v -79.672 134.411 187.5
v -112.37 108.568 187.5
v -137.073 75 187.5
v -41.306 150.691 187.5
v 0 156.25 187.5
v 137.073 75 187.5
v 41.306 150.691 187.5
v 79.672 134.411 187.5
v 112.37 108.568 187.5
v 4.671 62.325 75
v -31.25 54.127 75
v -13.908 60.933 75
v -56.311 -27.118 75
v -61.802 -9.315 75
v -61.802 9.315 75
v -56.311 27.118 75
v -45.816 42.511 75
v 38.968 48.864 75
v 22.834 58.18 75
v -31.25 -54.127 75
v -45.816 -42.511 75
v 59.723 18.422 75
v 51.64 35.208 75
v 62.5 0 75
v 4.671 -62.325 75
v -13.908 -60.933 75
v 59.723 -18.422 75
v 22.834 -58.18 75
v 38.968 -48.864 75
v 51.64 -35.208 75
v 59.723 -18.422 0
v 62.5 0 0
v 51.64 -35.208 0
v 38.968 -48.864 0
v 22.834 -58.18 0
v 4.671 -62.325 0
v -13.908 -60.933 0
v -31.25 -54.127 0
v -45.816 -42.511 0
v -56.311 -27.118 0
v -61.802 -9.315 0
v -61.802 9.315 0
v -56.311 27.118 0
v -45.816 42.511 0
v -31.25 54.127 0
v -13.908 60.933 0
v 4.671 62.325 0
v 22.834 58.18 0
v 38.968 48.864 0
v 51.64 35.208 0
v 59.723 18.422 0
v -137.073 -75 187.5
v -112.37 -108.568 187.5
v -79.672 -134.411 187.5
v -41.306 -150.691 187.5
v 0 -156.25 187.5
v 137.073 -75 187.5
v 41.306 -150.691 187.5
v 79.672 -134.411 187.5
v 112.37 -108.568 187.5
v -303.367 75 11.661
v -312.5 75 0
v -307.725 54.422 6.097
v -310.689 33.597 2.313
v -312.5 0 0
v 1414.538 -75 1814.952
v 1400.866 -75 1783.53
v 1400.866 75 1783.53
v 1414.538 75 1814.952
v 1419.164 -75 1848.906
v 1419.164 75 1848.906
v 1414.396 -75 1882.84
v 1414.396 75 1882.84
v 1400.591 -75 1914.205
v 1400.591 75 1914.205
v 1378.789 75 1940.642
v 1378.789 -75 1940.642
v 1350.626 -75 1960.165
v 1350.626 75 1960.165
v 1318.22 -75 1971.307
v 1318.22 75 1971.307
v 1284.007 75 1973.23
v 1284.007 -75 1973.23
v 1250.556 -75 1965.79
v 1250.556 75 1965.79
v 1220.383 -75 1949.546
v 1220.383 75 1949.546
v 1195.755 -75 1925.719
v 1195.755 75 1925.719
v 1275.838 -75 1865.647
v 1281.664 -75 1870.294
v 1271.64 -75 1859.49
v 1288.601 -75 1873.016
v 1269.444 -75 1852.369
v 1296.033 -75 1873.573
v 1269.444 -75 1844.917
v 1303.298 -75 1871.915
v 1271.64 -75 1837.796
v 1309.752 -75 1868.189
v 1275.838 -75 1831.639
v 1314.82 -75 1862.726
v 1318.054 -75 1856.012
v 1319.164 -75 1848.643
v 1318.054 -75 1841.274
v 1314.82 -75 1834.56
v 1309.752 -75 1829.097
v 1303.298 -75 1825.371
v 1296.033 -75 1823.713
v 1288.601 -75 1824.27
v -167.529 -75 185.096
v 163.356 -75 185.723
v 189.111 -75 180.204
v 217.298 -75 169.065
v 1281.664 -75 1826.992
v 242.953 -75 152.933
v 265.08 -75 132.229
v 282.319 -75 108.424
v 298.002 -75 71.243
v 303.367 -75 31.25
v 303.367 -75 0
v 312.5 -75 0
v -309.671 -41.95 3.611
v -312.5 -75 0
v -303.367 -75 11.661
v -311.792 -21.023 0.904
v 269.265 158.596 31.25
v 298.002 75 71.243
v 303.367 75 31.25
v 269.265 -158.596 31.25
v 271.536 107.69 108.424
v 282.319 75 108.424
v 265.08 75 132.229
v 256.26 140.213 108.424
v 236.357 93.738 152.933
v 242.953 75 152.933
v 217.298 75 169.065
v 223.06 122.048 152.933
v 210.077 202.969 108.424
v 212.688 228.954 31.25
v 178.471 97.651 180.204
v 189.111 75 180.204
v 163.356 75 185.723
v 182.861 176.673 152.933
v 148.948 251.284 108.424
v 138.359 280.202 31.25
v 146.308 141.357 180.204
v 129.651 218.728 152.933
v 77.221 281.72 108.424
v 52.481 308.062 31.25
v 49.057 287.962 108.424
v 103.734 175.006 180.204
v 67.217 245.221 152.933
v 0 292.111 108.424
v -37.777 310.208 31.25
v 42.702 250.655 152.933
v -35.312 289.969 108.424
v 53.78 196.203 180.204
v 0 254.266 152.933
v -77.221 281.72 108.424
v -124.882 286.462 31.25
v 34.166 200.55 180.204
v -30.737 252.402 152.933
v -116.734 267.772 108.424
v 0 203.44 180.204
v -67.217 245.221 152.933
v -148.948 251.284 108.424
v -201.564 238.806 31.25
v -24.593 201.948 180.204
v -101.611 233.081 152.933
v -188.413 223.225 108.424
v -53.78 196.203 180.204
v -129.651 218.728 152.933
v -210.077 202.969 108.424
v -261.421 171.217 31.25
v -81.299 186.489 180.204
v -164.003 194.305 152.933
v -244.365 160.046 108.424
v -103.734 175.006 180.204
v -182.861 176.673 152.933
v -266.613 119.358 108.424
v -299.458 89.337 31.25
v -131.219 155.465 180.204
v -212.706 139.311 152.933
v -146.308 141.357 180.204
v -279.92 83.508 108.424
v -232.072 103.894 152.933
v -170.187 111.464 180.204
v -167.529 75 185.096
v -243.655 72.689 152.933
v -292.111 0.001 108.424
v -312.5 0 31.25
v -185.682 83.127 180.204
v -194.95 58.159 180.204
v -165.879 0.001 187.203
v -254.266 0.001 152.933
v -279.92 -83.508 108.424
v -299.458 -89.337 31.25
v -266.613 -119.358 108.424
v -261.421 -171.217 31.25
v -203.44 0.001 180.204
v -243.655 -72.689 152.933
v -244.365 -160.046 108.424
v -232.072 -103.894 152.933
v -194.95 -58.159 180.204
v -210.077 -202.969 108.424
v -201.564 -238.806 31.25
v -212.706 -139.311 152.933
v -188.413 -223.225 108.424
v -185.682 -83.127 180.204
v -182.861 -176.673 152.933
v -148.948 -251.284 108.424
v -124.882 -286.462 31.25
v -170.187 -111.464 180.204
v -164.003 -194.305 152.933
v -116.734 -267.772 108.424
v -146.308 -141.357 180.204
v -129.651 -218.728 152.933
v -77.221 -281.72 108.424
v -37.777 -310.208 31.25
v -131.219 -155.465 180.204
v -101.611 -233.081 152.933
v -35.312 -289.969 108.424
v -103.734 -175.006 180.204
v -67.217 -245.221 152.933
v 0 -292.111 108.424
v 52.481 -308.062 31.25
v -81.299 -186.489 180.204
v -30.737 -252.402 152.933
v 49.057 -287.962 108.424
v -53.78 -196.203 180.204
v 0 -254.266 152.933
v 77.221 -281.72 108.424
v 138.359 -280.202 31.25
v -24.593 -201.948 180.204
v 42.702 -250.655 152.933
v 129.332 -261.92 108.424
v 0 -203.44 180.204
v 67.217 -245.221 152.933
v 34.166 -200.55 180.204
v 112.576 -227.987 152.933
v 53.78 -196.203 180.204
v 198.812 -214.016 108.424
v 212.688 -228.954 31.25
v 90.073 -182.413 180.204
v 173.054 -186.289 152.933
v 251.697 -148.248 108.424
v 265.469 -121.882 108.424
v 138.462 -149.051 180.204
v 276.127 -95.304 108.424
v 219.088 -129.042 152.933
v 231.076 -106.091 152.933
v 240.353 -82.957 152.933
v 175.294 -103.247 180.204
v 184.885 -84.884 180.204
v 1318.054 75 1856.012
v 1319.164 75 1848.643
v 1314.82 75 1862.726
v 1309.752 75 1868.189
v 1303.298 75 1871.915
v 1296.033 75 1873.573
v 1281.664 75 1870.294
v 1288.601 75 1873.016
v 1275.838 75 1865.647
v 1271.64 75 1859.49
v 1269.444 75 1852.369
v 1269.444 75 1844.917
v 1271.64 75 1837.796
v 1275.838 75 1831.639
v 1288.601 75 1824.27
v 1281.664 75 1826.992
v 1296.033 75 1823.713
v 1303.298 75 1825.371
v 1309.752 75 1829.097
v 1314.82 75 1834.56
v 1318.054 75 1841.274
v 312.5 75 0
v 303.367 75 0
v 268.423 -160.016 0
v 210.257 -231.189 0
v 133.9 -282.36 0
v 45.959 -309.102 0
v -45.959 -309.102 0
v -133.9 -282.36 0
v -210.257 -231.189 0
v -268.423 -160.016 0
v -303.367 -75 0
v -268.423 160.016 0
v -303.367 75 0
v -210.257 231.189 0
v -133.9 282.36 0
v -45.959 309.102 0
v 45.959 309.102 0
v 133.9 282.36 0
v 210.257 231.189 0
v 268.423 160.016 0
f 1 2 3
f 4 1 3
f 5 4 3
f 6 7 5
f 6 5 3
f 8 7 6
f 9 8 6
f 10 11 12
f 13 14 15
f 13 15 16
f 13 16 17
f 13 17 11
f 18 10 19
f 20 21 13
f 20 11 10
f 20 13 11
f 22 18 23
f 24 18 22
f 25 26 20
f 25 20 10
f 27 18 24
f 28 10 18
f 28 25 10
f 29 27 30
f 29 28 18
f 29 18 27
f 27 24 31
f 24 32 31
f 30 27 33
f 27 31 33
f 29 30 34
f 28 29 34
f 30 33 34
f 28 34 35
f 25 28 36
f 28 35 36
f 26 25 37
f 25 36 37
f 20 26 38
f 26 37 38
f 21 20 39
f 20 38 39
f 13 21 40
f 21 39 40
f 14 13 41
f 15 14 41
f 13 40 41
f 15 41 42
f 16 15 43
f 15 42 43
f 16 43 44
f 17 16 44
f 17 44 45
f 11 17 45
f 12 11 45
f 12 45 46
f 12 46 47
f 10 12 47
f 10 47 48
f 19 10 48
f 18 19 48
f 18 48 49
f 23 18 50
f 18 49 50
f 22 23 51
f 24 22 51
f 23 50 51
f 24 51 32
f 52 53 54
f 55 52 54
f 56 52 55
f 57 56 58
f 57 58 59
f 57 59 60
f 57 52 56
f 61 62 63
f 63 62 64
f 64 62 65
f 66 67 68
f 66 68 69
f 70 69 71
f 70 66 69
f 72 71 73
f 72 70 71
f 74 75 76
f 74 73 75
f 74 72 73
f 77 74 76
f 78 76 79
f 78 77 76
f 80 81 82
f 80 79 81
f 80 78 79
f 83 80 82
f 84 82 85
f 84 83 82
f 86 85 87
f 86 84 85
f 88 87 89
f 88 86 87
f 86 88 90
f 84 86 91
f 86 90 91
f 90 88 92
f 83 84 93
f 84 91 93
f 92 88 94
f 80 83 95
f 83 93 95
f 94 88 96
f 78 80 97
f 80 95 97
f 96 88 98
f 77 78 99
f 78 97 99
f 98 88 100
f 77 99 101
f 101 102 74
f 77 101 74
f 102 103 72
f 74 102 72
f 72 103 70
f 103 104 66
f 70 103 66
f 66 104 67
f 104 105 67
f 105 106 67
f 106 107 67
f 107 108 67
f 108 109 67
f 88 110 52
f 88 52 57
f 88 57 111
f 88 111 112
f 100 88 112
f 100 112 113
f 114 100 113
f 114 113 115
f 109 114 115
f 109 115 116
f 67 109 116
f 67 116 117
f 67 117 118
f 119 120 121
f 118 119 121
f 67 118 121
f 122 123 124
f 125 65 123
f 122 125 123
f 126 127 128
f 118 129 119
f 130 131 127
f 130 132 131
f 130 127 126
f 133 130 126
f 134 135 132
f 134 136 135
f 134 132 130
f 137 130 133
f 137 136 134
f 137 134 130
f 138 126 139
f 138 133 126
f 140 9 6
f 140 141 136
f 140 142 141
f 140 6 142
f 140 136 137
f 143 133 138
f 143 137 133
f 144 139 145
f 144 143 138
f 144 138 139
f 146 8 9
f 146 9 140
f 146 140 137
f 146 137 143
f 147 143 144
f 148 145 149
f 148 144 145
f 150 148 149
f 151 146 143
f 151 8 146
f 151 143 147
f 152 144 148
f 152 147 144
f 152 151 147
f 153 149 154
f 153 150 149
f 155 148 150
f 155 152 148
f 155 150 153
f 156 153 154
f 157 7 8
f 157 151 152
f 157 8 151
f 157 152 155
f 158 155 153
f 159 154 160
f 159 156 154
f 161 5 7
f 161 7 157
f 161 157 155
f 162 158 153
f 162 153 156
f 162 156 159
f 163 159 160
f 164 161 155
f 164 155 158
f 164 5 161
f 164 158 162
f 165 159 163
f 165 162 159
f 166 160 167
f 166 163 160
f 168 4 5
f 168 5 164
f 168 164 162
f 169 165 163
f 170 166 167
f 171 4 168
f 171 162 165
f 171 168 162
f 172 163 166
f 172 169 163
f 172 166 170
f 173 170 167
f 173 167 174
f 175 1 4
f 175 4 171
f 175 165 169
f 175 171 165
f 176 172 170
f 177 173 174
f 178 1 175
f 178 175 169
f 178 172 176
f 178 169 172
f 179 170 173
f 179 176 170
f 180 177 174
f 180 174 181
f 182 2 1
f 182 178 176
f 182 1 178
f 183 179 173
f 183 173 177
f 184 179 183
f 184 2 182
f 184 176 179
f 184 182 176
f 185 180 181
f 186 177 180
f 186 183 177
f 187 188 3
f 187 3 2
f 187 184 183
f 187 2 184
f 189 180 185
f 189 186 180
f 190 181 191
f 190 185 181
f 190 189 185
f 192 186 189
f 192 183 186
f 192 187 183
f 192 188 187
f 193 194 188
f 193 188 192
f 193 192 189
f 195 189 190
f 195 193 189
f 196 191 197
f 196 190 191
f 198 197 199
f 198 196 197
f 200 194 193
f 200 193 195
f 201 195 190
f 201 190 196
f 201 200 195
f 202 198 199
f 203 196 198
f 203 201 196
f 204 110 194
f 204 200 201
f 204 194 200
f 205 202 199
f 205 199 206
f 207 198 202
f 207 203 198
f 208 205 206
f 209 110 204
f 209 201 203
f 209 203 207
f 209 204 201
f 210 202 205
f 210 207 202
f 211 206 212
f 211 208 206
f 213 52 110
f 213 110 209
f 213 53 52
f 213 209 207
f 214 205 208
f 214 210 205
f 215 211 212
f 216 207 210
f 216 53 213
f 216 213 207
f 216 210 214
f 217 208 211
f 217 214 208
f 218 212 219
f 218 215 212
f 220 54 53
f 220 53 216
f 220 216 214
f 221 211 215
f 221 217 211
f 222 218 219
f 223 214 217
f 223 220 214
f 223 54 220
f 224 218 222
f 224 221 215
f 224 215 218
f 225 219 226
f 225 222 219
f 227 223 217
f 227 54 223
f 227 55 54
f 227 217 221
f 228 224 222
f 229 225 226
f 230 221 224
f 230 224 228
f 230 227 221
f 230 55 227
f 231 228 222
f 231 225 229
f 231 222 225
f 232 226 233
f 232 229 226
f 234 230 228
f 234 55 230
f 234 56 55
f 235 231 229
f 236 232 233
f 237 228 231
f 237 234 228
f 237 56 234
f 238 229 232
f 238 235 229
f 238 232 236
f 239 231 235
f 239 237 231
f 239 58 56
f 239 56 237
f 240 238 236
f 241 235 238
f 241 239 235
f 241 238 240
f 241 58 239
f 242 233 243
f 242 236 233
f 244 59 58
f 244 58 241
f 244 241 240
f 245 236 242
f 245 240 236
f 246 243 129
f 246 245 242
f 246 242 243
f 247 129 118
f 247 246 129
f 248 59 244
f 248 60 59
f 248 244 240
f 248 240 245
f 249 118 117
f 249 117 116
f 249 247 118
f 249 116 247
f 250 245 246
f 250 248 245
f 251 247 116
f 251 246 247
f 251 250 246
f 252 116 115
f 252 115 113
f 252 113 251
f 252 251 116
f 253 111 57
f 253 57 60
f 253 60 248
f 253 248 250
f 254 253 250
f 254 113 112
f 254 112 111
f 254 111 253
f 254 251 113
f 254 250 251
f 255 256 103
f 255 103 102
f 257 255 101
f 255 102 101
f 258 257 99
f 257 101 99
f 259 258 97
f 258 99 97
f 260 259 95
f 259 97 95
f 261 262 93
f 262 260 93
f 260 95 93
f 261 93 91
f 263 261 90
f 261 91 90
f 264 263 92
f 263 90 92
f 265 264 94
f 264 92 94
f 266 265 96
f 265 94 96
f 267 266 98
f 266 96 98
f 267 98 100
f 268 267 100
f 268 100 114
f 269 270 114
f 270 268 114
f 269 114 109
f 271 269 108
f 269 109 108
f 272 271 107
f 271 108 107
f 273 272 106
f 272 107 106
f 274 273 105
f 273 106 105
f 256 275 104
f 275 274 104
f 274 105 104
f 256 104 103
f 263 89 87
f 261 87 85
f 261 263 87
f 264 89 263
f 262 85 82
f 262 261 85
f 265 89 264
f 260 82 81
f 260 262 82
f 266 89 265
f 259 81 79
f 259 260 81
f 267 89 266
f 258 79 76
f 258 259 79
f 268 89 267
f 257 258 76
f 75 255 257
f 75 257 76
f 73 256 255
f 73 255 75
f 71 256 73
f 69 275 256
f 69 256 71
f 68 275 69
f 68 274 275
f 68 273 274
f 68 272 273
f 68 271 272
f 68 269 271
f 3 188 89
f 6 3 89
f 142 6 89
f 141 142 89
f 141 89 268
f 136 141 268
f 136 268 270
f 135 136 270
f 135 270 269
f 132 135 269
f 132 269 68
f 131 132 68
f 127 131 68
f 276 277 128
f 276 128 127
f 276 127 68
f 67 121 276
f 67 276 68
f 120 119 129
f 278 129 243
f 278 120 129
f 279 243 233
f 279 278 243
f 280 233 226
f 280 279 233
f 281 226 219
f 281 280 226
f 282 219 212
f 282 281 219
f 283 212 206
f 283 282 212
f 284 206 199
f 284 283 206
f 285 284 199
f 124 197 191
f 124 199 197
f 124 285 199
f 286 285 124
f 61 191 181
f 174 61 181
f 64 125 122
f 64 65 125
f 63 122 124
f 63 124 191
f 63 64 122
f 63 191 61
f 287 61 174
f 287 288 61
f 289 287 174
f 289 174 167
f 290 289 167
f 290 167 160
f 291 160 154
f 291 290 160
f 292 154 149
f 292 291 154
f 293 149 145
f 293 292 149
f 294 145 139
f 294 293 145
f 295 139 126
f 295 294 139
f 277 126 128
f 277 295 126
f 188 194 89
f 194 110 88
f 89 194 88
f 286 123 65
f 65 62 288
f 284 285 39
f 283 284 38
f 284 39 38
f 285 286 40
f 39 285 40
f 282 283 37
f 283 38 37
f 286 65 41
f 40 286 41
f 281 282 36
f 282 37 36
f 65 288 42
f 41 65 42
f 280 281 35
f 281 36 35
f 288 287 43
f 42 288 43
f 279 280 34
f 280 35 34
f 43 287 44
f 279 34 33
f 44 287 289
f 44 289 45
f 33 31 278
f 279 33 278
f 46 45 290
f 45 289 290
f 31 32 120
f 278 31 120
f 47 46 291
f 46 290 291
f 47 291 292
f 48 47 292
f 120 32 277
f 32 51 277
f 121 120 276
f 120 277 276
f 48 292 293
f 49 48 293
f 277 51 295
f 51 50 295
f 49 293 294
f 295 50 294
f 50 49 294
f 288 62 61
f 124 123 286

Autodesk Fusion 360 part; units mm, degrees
sketch "Sketch1" plane through (0, 0, 0) normal (0, 0, 1) x (1, 0, 0)
  circle A0 centre (0, 0) radius 125
  dimension "d1" = 250
extrude "Extrude1" add sketch "Sketch1" along normal blind 75
fillet "Fillet1" radius 62.5 1 edges at (-116.5409, -45.2019, 75)
sketch "Sketch2" plane through (0, 0, 0) normal (0, 0, -1) x (1, 0, 0)
  circle A0 centre (0, 0) radius 125
  circle A1 centre (0, 0) radius 25
  dimension "d6" = 50
extrude "Extrude2" cut sketch "Sketch2" against normal blind 25 contours A1
sketch "Sketch3" plane through (0, 0, 0) normal (0, 1, 0) x (1, 0, 0)
  line L0 (62.5, -75) -> (-62.5, -75)
  line L1 (-125, 0) -> (125, 0)
  line L2 (-125, 0) -> (478.3021, -770.2875)
  line L3 (125, 0) -> (560.3465, -713.412)
  arc A0 (478.3021, -770.2875) -> (560.3465, -713.412) centre (517.6658, -739.4572) ccw
  circle A1 centre (517.6658, -739.4572) radius 10
  dimension "d23" = 100
  dimension "d24" = 20
extrude "Extrude6" add sketch "Sketch3" along normal blind 30 and the other way blind 30
sketch "Sketch5" plane through (0, 0, 0) normal (0, 0, -1) x (1, 0, 0)
  arc A0 (121.3466, 30) -> (-121.3466, 30) centre (0, 0) ccw
  line L0 (-121.3466, 30) -> (-125, 30)
  line L1 (-125, 30) -> (-125, 0)
  line L2 (-125, 0) -> (-125, -30)
  line L3 (-125, -30) -> (-121.3466, -30)
  arc A1 (-121.3466, -30) -> (121.3466, -30) centre (0, 0) ccw
  line L4 (121.3466, -30) -> (125, -30)
  line L5 (125, -30) -> (125, 30)
  line L6 (125, 30) -> (121.3466, 30)
  circle A2 centre (0, 0) radius 25
  dimension "d29" = 50
extrude "Extrude7" cut sketch "Sketch5" against normal blind 30 contours A2
scale "Scale1" factor 2.5 about (0, 0, 0) bodies 1
